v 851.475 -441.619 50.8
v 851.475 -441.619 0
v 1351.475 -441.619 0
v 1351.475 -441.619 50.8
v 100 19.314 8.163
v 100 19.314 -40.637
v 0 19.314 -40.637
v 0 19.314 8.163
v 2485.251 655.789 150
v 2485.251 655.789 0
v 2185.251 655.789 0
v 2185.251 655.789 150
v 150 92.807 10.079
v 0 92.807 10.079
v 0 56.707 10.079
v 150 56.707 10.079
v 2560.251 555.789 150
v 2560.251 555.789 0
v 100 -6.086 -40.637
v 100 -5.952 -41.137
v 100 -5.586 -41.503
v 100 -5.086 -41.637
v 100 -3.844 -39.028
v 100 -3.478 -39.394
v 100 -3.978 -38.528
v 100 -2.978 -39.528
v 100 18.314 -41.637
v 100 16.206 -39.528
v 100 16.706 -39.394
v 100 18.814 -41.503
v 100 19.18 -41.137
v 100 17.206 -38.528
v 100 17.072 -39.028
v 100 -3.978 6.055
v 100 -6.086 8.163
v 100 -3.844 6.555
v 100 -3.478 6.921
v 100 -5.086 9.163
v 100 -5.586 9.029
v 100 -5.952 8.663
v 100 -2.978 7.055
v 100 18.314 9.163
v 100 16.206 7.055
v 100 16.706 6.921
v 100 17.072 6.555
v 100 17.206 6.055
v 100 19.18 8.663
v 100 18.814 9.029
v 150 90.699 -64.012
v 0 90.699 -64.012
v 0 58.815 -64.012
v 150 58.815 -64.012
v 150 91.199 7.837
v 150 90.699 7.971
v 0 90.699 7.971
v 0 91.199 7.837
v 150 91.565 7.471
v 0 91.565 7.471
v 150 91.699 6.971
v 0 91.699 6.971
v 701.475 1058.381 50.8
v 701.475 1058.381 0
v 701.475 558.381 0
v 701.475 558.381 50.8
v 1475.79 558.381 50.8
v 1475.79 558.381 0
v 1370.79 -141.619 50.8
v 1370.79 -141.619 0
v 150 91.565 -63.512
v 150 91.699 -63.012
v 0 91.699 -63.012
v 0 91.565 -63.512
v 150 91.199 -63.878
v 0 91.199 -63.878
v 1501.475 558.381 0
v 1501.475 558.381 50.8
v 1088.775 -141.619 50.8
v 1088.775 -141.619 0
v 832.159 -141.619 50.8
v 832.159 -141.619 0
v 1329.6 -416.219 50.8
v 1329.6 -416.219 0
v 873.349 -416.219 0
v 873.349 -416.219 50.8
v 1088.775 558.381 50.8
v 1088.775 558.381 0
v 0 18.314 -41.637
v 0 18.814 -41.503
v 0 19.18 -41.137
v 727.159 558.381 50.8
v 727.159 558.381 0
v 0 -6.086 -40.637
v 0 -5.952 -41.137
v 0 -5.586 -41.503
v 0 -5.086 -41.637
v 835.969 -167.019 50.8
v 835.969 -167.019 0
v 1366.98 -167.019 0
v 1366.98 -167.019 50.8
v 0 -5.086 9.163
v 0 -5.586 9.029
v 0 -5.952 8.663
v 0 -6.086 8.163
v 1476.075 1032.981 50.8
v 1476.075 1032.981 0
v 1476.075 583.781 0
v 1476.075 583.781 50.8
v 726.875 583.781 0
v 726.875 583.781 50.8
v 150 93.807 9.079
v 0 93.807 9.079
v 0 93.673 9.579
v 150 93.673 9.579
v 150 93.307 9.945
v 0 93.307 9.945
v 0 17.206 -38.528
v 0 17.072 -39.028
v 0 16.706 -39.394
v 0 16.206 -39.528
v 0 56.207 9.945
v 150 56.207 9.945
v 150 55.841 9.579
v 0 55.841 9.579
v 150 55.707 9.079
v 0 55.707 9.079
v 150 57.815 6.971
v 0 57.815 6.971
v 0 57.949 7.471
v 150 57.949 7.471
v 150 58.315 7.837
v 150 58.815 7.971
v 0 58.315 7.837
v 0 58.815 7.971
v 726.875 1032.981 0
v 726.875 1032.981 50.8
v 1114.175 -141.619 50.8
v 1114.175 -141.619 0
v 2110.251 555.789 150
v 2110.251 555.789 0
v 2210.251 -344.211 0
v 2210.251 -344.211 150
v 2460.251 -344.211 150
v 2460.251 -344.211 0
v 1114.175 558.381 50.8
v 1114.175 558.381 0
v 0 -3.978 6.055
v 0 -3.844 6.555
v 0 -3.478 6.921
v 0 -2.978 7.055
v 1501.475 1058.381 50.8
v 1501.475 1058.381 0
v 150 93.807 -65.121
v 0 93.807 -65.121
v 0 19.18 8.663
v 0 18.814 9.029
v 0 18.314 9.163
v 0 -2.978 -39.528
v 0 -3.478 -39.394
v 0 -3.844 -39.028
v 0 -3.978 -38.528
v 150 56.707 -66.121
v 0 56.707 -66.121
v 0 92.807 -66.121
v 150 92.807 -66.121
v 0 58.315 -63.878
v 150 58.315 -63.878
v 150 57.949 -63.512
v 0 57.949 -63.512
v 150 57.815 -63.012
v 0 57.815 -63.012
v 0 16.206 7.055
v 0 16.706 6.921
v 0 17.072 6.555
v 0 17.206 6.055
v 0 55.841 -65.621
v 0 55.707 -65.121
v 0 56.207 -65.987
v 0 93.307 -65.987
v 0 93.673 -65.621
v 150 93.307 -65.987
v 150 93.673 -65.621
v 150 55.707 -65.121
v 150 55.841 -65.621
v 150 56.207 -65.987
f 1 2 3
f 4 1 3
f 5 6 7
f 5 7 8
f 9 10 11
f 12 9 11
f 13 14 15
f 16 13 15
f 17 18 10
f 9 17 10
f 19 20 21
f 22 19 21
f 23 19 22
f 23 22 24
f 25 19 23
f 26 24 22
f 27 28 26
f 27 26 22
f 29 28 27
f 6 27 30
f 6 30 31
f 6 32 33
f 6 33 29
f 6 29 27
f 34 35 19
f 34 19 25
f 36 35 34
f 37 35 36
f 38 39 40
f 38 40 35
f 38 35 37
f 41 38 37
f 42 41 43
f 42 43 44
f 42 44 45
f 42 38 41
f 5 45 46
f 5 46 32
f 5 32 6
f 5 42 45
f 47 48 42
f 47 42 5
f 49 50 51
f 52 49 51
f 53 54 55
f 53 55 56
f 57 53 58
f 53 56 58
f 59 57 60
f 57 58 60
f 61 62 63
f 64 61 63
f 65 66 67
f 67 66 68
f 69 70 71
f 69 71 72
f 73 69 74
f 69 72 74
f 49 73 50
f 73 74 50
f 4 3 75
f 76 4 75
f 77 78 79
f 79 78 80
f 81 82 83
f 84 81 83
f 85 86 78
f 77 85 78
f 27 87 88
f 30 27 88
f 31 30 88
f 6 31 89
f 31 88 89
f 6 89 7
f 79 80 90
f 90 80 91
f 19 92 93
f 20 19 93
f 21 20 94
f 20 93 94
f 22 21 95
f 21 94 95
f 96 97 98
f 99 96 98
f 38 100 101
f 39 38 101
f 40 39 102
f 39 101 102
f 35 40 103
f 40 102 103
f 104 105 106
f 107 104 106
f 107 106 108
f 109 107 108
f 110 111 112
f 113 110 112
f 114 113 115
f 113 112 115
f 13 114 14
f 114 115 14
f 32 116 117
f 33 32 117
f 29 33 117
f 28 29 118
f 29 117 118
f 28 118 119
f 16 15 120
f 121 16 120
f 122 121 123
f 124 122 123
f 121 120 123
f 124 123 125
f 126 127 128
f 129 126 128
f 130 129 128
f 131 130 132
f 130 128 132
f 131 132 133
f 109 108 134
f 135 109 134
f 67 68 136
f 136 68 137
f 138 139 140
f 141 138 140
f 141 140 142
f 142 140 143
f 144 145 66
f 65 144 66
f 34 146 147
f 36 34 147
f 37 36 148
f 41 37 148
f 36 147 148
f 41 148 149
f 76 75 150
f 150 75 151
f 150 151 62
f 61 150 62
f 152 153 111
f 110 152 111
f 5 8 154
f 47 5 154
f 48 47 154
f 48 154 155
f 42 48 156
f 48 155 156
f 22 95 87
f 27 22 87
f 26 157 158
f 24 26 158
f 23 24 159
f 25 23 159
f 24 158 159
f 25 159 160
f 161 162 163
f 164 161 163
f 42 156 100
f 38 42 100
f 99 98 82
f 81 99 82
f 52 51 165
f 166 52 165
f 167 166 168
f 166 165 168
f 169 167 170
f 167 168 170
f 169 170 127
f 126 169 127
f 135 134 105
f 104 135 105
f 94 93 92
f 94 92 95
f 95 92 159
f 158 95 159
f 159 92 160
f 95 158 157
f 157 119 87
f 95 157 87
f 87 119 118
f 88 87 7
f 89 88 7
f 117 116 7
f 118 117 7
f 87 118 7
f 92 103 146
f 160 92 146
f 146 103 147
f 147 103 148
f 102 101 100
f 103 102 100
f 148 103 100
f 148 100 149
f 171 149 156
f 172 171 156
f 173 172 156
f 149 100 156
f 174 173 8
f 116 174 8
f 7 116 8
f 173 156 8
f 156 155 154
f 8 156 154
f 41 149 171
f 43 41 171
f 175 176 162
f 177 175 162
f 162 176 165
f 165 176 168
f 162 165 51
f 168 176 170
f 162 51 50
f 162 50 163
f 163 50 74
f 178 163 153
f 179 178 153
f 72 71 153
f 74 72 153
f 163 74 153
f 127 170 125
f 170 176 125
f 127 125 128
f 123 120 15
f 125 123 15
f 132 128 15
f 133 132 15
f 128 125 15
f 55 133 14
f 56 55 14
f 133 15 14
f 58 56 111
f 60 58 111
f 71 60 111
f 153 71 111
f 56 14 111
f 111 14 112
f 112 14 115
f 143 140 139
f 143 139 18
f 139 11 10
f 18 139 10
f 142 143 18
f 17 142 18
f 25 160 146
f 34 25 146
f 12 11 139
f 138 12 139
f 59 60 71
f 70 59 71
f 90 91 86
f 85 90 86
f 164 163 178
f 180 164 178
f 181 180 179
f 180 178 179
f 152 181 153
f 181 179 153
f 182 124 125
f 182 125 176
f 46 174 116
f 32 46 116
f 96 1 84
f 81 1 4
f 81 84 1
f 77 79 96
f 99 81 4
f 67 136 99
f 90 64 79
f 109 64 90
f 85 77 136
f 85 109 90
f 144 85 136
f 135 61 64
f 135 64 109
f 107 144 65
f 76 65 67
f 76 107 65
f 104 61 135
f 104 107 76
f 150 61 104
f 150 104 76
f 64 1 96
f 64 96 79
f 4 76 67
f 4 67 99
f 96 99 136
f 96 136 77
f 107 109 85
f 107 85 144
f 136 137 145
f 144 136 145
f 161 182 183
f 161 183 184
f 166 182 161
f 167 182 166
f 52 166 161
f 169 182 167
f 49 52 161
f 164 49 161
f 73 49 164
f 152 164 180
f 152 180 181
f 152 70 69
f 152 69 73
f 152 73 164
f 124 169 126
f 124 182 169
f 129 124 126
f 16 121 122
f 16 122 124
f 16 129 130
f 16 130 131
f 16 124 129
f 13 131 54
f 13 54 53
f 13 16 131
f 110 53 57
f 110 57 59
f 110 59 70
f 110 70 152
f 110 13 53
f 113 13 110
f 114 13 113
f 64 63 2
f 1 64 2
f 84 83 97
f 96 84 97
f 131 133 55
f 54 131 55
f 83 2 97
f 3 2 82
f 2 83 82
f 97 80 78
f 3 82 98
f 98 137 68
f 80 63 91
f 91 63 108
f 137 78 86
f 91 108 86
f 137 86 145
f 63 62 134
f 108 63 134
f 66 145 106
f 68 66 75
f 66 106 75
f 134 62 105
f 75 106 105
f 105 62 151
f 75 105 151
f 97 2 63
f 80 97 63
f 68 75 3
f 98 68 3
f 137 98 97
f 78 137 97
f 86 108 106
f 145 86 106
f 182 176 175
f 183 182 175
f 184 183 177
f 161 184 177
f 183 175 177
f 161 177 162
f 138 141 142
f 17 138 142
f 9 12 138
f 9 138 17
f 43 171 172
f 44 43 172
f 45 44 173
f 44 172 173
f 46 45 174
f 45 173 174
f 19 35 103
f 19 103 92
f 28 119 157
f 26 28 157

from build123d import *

# Parameters (mm, degrees)
F1_DEPTH = 100
F2_DEPTH = 150
F5_DEPTH = 150
F6_DEPTH = 50.8


with BuildPart() as f1:
    # F0 (on Right) → F1 (new body)
    with BuildSketch(Plane.YZ):
        with BuildLine():
            Line((18.313764, 9.163407), (-5.086236, 9.163407))
            ThreePointArc((-5.086236, 9.163407), (-5.793343, 8.870514), (-6.086236, 8.163407))
            Line((-6.086236, 8.163407), (-6.086236, -40.636593))
            ThreePointArc((-6.086236, -40.636593), (-5.793343, -41.3437), (-5.086236, -41.636593))
            Line((-5.086236, -41.636593), (18.313764, -41.636593))
            ThreePointArc((18.313764, -41.636593), (19.020871, -41.3437), (19.313764, -40.636593))
            Line((19.313764, -40.636593), (19.313764, 8.163407))
            ThreePointArc((19.313764, 8.163407), (19.020871, 8.870514), (18.313764, 9.163407))
        make_face()
        with BuildLine():
            ThreePointArc((-3.978036, 6.055207), (-3.685143, 6.762314), (-2.978036, 7.055207))
            Line((-2.978036, 7.055207), (16.205564, 7.055207))
            ThreePointArc((16.205564, 7.055207), (16.912671, 6.762314), (17.205564, 6.055207))
            Line((17.205564, 6.055207), (17.205564, -38.528393))
            ThreePointArc((17.205564, -38.528393), (16.912671, -39.2355), (16.205564, -39.528393))
            Line((16.205564, -39.528393), (-2.978036, -39.528393))
            ThreePointArc((-2.978036, -39.528393), (-3.685143, -39.2355), (-3.978036, -38.528393))
            Line((-3.978036, -38.528393), (-3.978036, 6.055207))
        make_face(mode=Mode.SUBTRACT)
    extrude(amount=F1_DEPTH)


with BuildPart() as f2:
    # F0 (on Right) → F2 (new body)
    with BuildSketch(Plane.YZ):
        with BuildLine():
            Line((92.806729, 10.079439), (56.706729, 10.079439))
            ThreePointArc((56.706729, 10.079439), (55.999622, 9.786546), (55.706729, 9.079439))
            Line((55.706729, 9.079439), (55.706729, -65.120561))
            ThreePointArc((55.706729, -65.120561), (55.999622, -65.827668), (56.706729, -66.120561))
            Line((56.706729, -66.120561), (92.806729, -66.120561))
            ThreePointArc((92.806729, -66.120561), (93.513835, -65.827668), (93.806729, -65.120561))
            Line((93.806729, -65.120561), (93.806729, 9.079439))
            ThreePointArc((93.806729, 9.079439), (93.513835, 9.786546), (92.806729, 10.079439))
        make_face()
        with BuildLine():
            Line((57.814929, -63.012361), (57.814929, 6.971239))
            ThreePointArc((57.814929, 6.971239), (58.107822, 7.678346), (58.814929, 7.971239))
            Line((58.814929, 7.971239), (90.698529, 7.971239))
            ThreePointArc((90.698529, 7.971239), (91.405635, 7.678346), (91.698529, 6.971239))
            Line((91.698529, 6.971239), (91.698529, -63.012361))
            ThreePointArc((91.698529, -63.012361), (91.405635, -63.719468), (90.698529, -64.012361))
            Line((90.698529, -64.012361), (58.814929, -64.012361))
            ThreePointArc((58.814929, -64.012361), (58.107822, -63.719468), (57.814929, -63.012361))
        make_face(mode=Mode.SUBTRACT)
    extrude(amount=F2_DEPTH)


with BuildPart() as f5:
    # F4 (on Top) → F5 (new body)
    with BuildSketch(Plane.XY):
        Polygon((2210.250998, -344.211429), (2335.250998, -344.211429), (2460.250998, -344.211429), (2560.250998, 555.788571), (2485.250998, 655.788571), (2335.250998, 655.788571), (2185.250998, 655.788571), (2110.250998, 555.788571), align=None)
    extrude(amount=F5_DEPTH)


with BuildPart() as f6:
    # F3 (on Top) → F6 (new body)
    with BuildSketch(Plane.XY):
        Polygon((1501.474643, 1058.381399), (701.474643, 1058.381399), (701.474643, 558.381399), (851.474643, -441.618601), (1101.474643, -441.618601), (1351.474643, -441.618601), (1501.474643, 558.381399), align=None)
        Polygon((1101.474643, -416.218601), (873.348803, -416.218601), (835.968803, -167.018601), (1101.474643, -167.018601), (1366.980482, -167.018601), (1329.600482, -416.218601), align=None, mode=Mode.SUBTRACT)
        Polygon((727.158803, 558.381399), (1088.774643, 558.381399), (1088.774643, -141.618601), (832.158803, -141.618601), align=None, mode=Mode.SUBTRACT)
        Polygon((1114.174643, -141.618601), (1114.174643, 558.381399), (1475.790482, 558.381399), (1370.790482, -141.618601), align=None, mode=Mode.SUBTRACT)
        Polygon((726.874643, 583.781399), (726.874643, 1032.981399), (1476.074643, 1032.981399), (1476.074643, 583.781399), (1101.474643, 583.781399), align=None, mode=Mode.SUBTRACT)
    extrude(amount=F6_DEPTH)


solid = Compound([f1.part, f2.part, f5.part, f6.part])
